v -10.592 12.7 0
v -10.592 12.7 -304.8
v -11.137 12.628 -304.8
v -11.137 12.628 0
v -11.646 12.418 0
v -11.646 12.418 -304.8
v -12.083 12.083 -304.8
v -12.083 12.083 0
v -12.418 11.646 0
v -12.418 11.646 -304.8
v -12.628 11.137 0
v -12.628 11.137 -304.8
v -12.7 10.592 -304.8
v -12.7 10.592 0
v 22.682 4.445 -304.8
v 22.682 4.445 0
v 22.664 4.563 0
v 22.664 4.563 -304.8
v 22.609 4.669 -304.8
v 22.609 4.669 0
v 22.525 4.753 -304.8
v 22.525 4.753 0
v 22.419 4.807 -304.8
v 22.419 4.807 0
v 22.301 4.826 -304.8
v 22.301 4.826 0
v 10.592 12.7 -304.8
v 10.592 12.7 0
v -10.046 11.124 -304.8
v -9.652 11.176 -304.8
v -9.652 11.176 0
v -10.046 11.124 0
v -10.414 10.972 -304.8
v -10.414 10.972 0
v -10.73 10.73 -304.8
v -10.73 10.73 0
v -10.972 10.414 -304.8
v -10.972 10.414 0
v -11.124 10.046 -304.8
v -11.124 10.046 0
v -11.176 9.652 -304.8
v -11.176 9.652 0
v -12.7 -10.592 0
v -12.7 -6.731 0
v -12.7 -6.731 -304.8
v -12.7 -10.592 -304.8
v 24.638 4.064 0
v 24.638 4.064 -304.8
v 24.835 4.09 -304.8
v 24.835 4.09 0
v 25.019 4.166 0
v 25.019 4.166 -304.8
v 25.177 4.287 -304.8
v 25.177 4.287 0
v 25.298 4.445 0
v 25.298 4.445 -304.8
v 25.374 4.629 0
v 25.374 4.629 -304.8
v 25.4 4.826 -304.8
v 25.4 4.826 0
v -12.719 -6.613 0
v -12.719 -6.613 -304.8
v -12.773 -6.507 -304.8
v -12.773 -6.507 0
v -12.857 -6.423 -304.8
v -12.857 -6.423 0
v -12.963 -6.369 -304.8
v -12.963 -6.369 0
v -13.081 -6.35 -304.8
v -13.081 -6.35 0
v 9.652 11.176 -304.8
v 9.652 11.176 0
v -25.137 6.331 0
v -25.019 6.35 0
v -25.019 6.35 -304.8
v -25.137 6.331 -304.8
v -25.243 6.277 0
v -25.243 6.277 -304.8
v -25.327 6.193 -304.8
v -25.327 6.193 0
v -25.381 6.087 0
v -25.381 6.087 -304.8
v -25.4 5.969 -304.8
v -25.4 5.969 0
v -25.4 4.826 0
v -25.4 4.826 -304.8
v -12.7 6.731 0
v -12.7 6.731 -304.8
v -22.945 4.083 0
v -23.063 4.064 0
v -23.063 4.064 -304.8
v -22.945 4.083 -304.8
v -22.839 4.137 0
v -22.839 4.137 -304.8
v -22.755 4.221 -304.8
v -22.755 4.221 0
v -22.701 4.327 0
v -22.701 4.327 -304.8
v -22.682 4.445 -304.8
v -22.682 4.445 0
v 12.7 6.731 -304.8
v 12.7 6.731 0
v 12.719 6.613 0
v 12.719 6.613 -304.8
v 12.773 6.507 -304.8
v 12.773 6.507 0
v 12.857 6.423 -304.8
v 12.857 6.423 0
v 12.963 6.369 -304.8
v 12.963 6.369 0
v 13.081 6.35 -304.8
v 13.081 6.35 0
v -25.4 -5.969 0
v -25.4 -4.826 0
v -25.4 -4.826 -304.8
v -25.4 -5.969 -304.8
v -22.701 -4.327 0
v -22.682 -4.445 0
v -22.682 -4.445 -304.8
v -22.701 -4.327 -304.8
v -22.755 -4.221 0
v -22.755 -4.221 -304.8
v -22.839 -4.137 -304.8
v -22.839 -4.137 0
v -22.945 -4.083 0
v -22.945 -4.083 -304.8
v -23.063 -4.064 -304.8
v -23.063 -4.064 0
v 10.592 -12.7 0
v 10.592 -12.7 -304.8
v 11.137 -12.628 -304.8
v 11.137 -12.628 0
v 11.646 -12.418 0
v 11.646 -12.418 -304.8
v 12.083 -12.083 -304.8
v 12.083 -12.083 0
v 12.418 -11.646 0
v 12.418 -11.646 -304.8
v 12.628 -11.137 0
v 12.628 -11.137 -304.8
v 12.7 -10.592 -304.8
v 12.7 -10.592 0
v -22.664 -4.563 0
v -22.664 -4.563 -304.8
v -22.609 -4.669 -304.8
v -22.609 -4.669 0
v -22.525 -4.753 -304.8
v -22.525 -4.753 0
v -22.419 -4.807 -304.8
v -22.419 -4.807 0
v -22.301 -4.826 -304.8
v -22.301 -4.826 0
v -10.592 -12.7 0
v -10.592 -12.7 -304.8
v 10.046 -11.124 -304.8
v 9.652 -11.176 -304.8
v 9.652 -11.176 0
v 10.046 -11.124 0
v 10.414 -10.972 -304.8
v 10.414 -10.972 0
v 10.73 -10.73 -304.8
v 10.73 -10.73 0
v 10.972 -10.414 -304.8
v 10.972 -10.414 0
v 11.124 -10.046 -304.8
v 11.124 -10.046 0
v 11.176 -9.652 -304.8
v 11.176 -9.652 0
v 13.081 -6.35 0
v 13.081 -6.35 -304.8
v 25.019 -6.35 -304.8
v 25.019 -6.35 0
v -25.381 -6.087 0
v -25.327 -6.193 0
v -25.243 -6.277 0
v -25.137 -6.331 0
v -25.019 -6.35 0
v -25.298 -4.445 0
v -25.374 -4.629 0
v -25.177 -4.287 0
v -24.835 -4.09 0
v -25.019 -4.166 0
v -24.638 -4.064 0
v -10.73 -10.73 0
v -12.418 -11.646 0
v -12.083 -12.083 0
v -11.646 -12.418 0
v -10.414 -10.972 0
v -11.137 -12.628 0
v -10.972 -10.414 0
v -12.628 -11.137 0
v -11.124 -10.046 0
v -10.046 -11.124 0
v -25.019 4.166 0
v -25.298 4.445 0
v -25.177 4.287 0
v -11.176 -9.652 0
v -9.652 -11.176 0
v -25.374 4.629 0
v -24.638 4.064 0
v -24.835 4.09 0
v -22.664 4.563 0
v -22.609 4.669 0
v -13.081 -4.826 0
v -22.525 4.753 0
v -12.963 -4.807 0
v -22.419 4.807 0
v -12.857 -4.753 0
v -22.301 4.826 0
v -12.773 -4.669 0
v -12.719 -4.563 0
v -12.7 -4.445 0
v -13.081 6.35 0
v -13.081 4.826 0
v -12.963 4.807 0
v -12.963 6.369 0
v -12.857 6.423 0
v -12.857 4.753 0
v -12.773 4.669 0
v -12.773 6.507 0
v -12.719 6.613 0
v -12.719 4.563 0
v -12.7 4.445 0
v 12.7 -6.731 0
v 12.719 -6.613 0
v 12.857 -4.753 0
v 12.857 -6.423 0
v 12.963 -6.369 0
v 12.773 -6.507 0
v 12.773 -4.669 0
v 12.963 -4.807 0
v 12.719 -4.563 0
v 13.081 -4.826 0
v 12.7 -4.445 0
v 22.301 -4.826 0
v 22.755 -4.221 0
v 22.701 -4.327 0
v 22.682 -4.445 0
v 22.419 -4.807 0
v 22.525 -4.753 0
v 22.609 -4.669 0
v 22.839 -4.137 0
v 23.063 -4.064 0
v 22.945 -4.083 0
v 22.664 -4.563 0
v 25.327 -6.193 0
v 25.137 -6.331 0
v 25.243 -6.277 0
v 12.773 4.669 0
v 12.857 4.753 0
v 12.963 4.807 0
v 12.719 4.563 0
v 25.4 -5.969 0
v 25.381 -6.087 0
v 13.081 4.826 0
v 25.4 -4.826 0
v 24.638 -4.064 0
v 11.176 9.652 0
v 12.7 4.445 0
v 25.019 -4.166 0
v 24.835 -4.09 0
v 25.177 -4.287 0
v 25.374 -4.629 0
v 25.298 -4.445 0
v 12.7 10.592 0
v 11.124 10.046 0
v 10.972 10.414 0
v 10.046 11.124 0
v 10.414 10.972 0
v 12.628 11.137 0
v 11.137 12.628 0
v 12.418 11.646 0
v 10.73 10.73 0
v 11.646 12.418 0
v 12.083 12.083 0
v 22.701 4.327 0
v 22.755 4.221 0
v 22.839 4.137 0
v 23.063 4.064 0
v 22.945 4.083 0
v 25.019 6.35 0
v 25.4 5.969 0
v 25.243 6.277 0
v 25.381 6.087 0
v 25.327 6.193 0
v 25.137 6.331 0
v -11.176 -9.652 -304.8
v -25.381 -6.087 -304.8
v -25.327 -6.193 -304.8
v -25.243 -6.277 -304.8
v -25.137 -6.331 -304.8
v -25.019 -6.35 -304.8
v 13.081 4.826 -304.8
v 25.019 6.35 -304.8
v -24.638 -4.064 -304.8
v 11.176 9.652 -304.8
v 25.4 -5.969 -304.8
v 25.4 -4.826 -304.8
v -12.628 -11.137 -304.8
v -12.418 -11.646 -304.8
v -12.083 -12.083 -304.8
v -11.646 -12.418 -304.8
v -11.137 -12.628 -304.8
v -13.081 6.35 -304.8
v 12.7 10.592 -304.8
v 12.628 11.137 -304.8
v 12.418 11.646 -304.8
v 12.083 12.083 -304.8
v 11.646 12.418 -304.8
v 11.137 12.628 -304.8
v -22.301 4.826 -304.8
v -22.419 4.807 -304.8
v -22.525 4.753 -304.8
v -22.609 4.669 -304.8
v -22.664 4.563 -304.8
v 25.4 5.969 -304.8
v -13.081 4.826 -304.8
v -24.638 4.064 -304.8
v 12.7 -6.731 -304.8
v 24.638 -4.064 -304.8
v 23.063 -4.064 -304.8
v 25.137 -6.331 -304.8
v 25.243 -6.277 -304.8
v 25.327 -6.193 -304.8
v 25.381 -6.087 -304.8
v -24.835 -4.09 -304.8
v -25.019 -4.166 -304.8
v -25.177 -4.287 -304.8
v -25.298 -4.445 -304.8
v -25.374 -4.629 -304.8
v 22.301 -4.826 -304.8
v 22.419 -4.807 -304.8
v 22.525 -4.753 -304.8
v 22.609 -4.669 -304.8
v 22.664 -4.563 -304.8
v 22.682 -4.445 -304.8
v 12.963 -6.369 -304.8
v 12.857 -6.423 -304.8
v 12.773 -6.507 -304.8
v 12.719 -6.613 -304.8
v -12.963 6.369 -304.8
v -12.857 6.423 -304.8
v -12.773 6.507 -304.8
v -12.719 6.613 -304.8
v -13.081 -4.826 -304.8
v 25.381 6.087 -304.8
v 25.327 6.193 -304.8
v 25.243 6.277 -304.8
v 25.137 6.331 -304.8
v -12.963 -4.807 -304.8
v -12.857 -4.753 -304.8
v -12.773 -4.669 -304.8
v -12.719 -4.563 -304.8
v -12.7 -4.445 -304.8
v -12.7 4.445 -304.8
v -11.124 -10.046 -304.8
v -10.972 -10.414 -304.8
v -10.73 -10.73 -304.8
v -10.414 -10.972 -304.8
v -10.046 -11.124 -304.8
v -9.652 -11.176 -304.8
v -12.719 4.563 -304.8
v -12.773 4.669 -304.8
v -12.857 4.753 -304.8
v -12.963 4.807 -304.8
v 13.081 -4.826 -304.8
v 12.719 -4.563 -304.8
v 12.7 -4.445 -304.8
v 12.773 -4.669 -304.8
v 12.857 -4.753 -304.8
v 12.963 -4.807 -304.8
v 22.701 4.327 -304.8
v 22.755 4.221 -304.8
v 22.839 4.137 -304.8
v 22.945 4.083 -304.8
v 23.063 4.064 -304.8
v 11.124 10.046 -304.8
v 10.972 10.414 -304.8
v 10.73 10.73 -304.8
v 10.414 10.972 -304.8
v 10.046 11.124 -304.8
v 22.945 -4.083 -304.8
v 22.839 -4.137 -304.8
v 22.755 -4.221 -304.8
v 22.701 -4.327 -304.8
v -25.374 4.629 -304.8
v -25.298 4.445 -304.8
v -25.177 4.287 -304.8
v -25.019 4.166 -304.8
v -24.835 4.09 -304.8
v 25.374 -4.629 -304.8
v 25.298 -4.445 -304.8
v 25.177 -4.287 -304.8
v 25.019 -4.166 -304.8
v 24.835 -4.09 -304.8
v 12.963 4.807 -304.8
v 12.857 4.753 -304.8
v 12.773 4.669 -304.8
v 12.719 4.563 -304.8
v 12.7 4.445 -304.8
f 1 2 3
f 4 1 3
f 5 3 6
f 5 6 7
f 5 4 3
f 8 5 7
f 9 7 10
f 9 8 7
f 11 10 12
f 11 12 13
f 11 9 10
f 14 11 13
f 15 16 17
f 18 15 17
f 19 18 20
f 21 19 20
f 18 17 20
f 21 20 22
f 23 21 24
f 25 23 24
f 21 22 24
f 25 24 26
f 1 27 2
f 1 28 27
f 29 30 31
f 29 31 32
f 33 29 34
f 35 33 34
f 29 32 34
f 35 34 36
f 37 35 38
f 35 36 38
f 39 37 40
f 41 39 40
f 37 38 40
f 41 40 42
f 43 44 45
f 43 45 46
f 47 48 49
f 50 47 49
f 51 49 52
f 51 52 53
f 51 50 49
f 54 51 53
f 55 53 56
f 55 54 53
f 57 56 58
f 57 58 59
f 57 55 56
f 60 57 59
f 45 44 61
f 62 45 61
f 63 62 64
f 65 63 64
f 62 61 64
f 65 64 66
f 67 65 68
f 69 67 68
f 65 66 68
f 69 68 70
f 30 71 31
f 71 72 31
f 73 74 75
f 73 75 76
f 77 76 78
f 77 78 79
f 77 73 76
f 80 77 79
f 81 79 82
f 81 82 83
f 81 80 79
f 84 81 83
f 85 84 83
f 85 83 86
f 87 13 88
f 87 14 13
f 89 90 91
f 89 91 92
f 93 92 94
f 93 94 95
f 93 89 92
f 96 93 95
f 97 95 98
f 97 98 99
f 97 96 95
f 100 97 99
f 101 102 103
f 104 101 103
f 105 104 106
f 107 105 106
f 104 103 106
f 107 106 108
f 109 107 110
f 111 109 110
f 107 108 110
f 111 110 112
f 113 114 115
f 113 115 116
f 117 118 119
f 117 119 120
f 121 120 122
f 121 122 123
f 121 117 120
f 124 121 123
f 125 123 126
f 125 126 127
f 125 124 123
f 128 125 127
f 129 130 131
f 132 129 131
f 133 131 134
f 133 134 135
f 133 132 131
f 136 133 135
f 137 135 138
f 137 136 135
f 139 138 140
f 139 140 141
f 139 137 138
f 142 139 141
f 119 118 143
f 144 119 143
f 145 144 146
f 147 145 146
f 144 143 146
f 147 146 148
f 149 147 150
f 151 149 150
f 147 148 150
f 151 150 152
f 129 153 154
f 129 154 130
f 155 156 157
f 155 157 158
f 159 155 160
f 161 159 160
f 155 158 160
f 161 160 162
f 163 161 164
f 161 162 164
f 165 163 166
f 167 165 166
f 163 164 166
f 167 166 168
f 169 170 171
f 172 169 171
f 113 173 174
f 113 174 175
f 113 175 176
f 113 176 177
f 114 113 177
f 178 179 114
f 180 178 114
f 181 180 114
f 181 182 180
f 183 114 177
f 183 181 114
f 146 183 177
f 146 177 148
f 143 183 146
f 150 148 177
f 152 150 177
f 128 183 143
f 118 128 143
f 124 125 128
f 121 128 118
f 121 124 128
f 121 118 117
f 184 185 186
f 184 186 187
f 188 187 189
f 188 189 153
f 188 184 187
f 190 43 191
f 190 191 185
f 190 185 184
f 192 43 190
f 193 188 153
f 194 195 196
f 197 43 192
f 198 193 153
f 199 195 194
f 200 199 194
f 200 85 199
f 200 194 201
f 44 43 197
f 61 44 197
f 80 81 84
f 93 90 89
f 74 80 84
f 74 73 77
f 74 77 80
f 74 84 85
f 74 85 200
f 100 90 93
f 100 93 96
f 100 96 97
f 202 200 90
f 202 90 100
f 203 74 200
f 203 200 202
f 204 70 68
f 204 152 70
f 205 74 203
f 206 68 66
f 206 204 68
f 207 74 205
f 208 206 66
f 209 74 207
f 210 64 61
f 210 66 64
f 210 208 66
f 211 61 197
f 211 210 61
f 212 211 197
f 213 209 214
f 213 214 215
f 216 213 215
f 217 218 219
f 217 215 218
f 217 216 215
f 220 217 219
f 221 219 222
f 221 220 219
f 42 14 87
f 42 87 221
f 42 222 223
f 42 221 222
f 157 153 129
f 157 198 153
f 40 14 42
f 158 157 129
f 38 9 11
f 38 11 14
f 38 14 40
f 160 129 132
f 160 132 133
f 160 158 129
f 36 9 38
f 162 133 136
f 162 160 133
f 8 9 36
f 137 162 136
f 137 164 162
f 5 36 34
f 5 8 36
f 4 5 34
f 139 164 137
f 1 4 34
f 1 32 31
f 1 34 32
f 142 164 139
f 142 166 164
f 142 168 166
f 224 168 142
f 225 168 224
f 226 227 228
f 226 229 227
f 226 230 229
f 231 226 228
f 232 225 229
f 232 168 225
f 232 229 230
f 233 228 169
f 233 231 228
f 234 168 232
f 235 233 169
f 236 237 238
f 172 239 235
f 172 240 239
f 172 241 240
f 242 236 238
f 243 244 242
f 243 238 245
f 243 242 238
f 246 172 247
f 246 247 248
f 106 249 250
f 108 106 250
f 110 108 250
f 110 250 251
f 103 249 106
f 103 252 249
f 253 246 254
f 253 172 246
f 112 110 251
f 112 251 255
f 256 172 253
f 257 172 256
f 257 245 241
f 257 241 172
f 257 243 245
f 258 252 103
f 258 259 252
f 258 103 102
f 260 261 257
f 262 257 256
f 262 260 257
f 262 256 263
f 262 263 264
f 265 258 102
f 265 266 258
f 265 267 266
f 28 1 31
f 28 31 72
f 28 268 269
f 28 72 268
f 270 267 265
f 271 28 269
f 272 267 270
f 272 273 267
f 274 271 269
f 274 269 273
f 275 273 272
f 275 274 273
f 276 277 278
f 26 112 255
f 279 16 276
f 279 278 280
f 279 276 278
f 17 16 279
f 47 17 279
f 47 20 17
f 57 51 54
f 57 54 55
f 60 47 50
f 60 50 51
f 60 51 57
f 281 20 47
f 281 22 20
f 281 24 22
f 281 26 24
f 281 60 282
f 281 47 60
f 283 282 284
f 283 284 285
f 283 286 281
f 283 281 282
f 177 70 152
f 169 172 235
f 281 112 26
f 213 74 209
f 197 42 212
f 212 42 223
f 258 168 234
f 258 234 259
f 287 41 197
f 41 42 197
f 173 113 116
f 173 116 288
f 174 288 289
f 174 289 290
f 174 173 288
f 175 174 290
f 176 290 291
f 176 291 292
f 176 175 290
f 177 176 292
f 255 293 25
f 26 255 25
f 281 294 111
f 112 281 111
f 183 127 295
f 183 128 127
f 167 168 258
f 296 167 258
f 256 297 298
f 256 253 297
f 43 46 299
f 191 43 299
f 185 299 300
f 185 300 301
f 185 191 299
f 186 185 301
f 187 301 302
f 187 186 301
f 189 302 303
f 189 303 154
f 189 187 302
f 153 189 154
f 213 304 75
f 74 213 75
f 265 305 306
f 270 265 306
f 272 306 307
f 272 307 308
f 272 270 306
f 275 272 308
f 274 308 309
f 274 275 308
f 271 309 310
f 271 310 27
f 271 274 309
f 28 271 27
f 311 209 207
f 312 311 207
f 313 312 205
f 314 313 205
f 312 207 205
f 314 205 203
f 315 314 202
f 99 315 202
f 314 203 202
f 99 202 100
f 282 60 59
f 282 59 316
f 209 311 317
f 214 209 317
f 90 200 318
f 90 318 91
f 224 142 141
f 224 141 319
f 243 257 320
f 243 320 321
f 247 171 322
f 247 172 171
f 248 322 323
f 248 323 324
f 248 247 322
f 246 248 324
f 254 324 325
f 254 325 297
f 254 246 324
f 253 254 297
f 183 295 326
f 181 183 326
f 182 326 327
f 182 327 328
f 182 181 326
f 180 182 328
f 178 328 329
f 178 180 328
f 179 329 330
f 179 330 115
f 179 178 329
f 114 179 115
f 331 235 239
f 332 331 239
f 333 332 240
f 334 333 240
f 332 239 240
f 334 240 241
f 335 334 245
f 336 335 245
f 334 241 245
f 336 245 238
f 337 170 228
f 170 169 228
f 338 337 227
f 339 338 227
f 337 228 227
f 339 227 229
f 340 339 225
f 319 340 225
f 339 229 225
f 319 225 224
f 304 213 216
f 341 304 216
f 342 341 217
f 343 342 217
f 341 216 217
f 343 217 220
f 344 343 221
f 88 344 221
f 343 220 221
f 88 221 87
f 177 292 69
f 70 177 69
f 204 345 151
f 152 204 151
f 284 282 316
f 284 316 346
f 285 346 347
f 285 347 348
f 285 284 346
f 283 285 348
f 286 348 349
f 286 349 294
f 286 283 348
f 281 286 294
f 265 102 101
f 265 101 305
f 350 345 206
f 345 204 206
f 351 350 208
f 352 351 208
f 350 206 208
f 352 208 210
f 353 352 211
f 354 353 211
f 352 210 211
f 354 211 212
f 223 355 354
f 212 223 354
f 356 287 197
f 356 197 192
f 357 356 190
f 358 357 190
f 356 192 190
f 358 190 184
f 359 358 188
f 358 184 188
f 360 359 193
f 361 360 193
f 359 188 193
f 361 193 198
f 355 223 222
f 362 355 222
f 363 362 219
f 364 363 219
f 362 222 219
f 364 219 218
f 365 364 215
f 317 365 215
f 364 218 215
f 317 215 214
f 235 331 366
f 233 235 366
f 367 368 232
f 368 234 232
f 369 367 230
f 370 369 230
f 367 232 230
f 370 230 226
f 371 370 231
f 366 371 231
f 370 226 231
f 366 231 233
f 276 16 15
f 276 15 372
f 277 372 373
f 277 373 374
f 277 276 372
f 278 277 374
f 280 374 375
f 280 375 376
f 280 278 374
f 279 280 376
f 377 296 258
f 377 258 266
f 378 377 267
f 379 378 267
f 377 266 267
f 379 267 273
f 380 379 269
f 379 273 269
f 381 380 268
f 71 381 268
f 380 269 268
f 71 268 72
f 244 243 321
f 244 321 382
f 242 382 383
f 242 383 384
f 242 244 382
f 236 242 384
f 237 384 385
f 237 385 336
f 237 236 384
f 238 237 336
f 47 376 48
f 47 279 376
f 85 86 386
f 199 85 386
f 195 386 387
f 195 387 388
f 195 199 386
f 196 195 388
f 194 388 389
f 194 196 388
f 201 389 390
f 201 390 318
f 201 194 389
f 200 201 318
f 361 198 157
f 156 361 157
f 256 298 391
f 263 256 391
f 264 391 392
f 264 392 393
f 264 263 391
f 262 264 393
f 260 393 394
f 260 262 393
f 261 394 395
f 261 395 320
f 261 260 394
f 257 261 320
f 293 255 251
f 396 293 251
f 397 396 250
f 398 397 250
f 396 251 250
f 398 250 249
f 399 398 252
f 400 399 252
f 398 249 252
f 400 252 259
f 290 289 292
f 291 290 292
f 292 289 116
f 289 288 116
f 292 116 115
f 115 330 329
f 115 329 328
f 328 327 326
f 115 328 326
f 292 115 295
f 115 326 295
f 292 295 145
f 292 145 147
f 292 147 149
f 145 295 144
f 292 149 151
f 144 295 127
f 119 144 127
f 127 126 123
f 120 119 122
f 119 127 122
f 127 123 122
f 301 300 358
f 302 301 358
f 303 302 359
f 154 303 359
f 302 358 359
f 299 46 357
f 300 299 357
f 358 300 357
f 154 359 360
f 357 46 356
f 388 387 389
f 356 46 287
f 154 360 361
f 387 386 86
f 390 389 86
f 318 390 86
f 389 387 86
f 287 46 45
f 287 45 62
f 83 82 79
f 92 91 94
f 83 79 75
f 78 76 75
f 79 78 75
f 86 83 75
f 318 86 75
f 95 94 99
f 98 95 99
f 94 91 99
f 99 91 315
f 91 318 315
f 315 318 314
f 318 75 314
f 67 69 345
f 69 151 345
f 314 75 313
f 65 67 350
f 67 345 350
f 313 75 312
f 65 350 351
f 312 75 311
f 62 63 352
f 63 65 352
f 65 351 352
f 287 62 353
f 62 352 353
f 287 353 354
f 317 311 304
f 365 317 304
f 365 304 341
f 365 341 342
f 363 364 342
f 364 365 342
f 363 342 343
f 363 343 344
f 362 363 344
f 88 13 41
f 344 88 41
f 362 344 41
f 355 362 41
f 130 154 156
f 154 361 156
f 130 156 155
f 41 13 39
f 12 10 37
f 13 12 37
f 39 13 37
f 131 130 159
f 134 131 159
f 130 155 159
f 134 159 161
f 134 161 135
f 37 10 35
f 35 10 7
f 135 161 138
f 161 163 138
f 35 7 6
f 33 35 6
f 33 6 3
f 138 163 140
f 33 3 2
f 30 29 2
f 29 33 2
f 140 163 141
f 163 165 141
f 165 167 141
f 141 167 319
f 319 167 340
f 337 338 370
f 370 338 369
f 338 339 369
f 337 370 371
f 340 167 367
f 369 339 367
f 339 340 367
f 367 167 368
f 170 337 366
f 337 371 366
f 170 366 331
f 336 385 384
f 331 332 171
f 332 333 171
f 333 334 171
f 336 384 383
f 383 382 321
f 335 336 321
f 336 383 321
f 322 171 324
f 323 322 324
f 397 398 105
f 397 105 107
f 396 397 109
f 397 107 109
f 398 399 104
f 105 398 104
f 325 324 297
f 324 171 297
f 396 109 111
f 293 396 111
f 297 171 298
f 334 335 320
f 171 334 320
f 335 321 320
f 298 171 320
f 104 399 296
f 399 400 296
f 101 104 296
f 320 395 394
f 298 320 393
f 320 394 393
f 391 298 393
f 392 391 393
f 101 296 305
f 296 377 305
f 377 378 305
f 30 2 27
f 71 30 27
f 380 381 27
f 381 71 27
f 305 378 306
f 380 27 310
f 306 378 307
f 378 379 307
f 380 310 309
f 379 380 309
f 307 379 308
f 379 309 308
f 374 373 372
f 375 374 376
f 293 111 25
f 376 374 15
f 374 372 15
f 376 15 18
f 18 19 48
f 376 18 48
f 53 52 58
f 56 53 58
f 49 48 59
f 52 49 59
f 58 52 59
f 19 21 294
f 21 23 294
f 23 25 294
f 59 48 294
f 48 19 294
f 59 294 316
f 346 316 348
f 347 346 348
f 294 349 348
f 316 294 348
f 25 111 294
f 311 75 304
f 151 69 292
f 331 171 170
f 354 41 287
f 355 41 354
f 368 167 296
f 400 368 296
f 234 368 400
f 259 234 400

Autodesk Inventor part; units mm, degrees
ref_plane "YZ Plane" through (0, 0, 0) normal (1, 0, 0) x (0, 1, 0)
ref_plane "XZ Plane" through (0, 0, 0) normal (0, 1, 0) x (-1, 0, 0)
ref_plane "XY Plane" through (0, 0, 0) normal (0, 0, 1) x (1, 0, 0)
sketch "Sketch1" plane through (0, 0, 0) normal (0, 0, 1) x (1, 0, 0)
  line L0 (-9.652, -11.176) -> (9.652, -11.176)
  arc A0 (-11.176, -9.652) -> (-9.652, -11.176) centre (-9.652, -9.652) ccw
  line L1 (-11.176, 9.652) -> (-11.176, -9.652)
  arc A1 (-9.652, 11.176) -> (-11.176, 9.652) centre (-9.652, 9.652) ccw
  line L2 (9.652, 11.176) -> (-9.652, 11.176)
  arc A2 (11.176, 9.652) -> (9.652, 11.176) centre (9.652, 9.652) ccw
  line L3 (11.176, -9.652) -> (11.176, 9.652)
  arc A3 (9.652, -11.176) -> (11.176, -9.652) centre (9.652, -9.652) ccw
  arc A4 (12.7, 6.731) -> (13.081, 6.35) centre (13.081, 6.731) ccw
  line L4 (12.7, 6.731) -> (12.7, 10.5918)
  arc A5 (12.7, 10.5918) -> (10.5918, 12.7) centre (10.5918, 10.5918) ccw
  line L5 (10.5918, 12.7) -> (-10.5918, 12.7)
  arc A6 (-10.5918, 12.7) -> (-12.7, 10.5918) centre (-10.5918, 10.5918) ccw
  line L6 (-12.7, 10.5918) -> (-12.7, 6.731)
  arc A7 (-13.081, 6.35) -> (-12.7, 6.731) centre (-13.081, 6.731) ccw
  line L7 (-13.081, 6.35) -> (-25.019, 6.35)
  arc A8 (-25.019, 6.35) -> (-25.4, 5.969) centre (-25.019, 5.969) ccw
  line L8 (-25.4, 5.969) -> (-25.4, 4.826)
  arc A9 (-25.4, 4.826) -> (-24.638, 4.064) centre (-24.638, 4.826) ccw
  line L9 (-24.638, 4.064) -> (-23.0632, 4.064)
  arc A10 (-23.0632, 4.064) -> (-22.6822, 4.445) centre (-23.0632, 4.445) ccw
  arc A11 (-22.3012, 4.826) -> (-22.6822, 4.445) centre (-22.3012, 4.445) ccw
  line L10 (-22.3012, 4.826) -> (-13.081, 4.826)
  arc A12 (-12.7, 4.445) -> (-13.081, 4.826) centre (-13.081, 4.445) ccw
  line L11 (-12.7, 4.445) -> (-12.7, -4.445)
  arc A13 (-13.081, -4.826) -> (-12.7, -4.445) centre (-13.081, -4.445) ccw
  line L12 (-13.081, -4.826) -> (-22.3012, -4.826)
  arc A14 (-22.6822, -4.445) -> (-22.3012, -4.826) centre (-22.3012, -4.445) ccw
  arc A15 (-22.6822, -4.445) -> (-23.0632, -4.064) centre (-23.0632, -4.445) ccw
  line L13 (-23.0632, -4.064) -> (-24.638, -4.064)
  arc A16 (-24.638, -4.064) -> (-25.4, -4.826) centre (-24.638, -4.826) ccw
  line L14 (-25.4, -4.826) -> (-25.4, -5.969)
  arc A17 (-25.4, -5.969) -> (-25.019, -6.35) centre (-25.019, -5.969) ccw
  line L15 (-25.019, -6.35) -> (-13.081, -6.35)
  arc A18 (-12.7, -6.731) -> (-13.081, -6.35) centre (-13.081, -6.731) ccw
  line L16 (-12.7, -6.731) -> (-12.7, -10.5918)
  arc A19 (-12.7, -10.5918) -> (-10.5918, -12.7) centre (-10.5918, -10.5918) ccw
  line L17 (-10.5918, -12.7) -> (10.5918, -12.7)
  arc A20 (10.5918, -12.7) -> (12.7, -10.5918) centre (10.5918, -10.5918) ccw
  line L18 (12.7, -10.5918) -> (12.7, -6.731)
  arc A21 (13.081, -6.35) -> (12.7, -6.731) centre (13.081, -6.731) ccw
  line L19 (13.081, -6.35) -> (25.019, -6.35)
  arc A22 (25.019, -6.35) -> (25.4, -5.969) centre (25.019, -5.969) ccw
  line L20 (25.4, -5.969) -> (25.4, -4.826)
  arc A23 (25.4, -4.826) -> (24.638, -4.064) centre (24.638, -4.826) ccw
  line L21 (24.638, -4.064) -> (23.0632, -4.064)
  arc A24 (23.0632, -4.064) -> (22.6822, -4.445) centre (23.0632, -4.445) ccw
  arc A25 (22.3012, -4.826) -> (22.6822, -4.445) centre (22.3012, -4.445) ccw
  line L22 (22.3012, -4.826) -> (13.081, -4.826)
  arc A26 (12.7, -4.445) -> (13.081, -4.826) centre (13.081, -4.445) ccw
  line L23 (12.7, -4.445) -> (12.7, 4.445)
  arc A27 (13.081, 4.826) -> (12.7, 4.445) centre (13.081, 4.445) ccw
  line L24 (13.081, 4.826) -> (22.3012, 4.826)
  arc A28 (22.6822, 4.445) -> (22.3012, 4.826) centre (22.3012, 4.445) ccw
  arc A29 (22.6822, 4.445) -> (23.0632, 4.064) centre (23.0632, 4.445) ccw
  line L25 (23.0632, 4.064) -> (24.638, 4.064)
  arc A30 (24.638, 4.064) -> (25.4, 4.826) centre (24.638, 4.826) ccw
  line L26 (25.4, 4.826) -> (25.4, 5.969)
  arc A31 (25.4, 5.969) -> (25.019, 6.35) centre (25.019, 5.969) ccw
  line L27 (25.019, 6.35) -> (13.081, 6.35)
  point P0 (0, 0)
extrude "Extrusion1" add sketch "Sketch1" against normal blind 304.8
properties part number "9035"
